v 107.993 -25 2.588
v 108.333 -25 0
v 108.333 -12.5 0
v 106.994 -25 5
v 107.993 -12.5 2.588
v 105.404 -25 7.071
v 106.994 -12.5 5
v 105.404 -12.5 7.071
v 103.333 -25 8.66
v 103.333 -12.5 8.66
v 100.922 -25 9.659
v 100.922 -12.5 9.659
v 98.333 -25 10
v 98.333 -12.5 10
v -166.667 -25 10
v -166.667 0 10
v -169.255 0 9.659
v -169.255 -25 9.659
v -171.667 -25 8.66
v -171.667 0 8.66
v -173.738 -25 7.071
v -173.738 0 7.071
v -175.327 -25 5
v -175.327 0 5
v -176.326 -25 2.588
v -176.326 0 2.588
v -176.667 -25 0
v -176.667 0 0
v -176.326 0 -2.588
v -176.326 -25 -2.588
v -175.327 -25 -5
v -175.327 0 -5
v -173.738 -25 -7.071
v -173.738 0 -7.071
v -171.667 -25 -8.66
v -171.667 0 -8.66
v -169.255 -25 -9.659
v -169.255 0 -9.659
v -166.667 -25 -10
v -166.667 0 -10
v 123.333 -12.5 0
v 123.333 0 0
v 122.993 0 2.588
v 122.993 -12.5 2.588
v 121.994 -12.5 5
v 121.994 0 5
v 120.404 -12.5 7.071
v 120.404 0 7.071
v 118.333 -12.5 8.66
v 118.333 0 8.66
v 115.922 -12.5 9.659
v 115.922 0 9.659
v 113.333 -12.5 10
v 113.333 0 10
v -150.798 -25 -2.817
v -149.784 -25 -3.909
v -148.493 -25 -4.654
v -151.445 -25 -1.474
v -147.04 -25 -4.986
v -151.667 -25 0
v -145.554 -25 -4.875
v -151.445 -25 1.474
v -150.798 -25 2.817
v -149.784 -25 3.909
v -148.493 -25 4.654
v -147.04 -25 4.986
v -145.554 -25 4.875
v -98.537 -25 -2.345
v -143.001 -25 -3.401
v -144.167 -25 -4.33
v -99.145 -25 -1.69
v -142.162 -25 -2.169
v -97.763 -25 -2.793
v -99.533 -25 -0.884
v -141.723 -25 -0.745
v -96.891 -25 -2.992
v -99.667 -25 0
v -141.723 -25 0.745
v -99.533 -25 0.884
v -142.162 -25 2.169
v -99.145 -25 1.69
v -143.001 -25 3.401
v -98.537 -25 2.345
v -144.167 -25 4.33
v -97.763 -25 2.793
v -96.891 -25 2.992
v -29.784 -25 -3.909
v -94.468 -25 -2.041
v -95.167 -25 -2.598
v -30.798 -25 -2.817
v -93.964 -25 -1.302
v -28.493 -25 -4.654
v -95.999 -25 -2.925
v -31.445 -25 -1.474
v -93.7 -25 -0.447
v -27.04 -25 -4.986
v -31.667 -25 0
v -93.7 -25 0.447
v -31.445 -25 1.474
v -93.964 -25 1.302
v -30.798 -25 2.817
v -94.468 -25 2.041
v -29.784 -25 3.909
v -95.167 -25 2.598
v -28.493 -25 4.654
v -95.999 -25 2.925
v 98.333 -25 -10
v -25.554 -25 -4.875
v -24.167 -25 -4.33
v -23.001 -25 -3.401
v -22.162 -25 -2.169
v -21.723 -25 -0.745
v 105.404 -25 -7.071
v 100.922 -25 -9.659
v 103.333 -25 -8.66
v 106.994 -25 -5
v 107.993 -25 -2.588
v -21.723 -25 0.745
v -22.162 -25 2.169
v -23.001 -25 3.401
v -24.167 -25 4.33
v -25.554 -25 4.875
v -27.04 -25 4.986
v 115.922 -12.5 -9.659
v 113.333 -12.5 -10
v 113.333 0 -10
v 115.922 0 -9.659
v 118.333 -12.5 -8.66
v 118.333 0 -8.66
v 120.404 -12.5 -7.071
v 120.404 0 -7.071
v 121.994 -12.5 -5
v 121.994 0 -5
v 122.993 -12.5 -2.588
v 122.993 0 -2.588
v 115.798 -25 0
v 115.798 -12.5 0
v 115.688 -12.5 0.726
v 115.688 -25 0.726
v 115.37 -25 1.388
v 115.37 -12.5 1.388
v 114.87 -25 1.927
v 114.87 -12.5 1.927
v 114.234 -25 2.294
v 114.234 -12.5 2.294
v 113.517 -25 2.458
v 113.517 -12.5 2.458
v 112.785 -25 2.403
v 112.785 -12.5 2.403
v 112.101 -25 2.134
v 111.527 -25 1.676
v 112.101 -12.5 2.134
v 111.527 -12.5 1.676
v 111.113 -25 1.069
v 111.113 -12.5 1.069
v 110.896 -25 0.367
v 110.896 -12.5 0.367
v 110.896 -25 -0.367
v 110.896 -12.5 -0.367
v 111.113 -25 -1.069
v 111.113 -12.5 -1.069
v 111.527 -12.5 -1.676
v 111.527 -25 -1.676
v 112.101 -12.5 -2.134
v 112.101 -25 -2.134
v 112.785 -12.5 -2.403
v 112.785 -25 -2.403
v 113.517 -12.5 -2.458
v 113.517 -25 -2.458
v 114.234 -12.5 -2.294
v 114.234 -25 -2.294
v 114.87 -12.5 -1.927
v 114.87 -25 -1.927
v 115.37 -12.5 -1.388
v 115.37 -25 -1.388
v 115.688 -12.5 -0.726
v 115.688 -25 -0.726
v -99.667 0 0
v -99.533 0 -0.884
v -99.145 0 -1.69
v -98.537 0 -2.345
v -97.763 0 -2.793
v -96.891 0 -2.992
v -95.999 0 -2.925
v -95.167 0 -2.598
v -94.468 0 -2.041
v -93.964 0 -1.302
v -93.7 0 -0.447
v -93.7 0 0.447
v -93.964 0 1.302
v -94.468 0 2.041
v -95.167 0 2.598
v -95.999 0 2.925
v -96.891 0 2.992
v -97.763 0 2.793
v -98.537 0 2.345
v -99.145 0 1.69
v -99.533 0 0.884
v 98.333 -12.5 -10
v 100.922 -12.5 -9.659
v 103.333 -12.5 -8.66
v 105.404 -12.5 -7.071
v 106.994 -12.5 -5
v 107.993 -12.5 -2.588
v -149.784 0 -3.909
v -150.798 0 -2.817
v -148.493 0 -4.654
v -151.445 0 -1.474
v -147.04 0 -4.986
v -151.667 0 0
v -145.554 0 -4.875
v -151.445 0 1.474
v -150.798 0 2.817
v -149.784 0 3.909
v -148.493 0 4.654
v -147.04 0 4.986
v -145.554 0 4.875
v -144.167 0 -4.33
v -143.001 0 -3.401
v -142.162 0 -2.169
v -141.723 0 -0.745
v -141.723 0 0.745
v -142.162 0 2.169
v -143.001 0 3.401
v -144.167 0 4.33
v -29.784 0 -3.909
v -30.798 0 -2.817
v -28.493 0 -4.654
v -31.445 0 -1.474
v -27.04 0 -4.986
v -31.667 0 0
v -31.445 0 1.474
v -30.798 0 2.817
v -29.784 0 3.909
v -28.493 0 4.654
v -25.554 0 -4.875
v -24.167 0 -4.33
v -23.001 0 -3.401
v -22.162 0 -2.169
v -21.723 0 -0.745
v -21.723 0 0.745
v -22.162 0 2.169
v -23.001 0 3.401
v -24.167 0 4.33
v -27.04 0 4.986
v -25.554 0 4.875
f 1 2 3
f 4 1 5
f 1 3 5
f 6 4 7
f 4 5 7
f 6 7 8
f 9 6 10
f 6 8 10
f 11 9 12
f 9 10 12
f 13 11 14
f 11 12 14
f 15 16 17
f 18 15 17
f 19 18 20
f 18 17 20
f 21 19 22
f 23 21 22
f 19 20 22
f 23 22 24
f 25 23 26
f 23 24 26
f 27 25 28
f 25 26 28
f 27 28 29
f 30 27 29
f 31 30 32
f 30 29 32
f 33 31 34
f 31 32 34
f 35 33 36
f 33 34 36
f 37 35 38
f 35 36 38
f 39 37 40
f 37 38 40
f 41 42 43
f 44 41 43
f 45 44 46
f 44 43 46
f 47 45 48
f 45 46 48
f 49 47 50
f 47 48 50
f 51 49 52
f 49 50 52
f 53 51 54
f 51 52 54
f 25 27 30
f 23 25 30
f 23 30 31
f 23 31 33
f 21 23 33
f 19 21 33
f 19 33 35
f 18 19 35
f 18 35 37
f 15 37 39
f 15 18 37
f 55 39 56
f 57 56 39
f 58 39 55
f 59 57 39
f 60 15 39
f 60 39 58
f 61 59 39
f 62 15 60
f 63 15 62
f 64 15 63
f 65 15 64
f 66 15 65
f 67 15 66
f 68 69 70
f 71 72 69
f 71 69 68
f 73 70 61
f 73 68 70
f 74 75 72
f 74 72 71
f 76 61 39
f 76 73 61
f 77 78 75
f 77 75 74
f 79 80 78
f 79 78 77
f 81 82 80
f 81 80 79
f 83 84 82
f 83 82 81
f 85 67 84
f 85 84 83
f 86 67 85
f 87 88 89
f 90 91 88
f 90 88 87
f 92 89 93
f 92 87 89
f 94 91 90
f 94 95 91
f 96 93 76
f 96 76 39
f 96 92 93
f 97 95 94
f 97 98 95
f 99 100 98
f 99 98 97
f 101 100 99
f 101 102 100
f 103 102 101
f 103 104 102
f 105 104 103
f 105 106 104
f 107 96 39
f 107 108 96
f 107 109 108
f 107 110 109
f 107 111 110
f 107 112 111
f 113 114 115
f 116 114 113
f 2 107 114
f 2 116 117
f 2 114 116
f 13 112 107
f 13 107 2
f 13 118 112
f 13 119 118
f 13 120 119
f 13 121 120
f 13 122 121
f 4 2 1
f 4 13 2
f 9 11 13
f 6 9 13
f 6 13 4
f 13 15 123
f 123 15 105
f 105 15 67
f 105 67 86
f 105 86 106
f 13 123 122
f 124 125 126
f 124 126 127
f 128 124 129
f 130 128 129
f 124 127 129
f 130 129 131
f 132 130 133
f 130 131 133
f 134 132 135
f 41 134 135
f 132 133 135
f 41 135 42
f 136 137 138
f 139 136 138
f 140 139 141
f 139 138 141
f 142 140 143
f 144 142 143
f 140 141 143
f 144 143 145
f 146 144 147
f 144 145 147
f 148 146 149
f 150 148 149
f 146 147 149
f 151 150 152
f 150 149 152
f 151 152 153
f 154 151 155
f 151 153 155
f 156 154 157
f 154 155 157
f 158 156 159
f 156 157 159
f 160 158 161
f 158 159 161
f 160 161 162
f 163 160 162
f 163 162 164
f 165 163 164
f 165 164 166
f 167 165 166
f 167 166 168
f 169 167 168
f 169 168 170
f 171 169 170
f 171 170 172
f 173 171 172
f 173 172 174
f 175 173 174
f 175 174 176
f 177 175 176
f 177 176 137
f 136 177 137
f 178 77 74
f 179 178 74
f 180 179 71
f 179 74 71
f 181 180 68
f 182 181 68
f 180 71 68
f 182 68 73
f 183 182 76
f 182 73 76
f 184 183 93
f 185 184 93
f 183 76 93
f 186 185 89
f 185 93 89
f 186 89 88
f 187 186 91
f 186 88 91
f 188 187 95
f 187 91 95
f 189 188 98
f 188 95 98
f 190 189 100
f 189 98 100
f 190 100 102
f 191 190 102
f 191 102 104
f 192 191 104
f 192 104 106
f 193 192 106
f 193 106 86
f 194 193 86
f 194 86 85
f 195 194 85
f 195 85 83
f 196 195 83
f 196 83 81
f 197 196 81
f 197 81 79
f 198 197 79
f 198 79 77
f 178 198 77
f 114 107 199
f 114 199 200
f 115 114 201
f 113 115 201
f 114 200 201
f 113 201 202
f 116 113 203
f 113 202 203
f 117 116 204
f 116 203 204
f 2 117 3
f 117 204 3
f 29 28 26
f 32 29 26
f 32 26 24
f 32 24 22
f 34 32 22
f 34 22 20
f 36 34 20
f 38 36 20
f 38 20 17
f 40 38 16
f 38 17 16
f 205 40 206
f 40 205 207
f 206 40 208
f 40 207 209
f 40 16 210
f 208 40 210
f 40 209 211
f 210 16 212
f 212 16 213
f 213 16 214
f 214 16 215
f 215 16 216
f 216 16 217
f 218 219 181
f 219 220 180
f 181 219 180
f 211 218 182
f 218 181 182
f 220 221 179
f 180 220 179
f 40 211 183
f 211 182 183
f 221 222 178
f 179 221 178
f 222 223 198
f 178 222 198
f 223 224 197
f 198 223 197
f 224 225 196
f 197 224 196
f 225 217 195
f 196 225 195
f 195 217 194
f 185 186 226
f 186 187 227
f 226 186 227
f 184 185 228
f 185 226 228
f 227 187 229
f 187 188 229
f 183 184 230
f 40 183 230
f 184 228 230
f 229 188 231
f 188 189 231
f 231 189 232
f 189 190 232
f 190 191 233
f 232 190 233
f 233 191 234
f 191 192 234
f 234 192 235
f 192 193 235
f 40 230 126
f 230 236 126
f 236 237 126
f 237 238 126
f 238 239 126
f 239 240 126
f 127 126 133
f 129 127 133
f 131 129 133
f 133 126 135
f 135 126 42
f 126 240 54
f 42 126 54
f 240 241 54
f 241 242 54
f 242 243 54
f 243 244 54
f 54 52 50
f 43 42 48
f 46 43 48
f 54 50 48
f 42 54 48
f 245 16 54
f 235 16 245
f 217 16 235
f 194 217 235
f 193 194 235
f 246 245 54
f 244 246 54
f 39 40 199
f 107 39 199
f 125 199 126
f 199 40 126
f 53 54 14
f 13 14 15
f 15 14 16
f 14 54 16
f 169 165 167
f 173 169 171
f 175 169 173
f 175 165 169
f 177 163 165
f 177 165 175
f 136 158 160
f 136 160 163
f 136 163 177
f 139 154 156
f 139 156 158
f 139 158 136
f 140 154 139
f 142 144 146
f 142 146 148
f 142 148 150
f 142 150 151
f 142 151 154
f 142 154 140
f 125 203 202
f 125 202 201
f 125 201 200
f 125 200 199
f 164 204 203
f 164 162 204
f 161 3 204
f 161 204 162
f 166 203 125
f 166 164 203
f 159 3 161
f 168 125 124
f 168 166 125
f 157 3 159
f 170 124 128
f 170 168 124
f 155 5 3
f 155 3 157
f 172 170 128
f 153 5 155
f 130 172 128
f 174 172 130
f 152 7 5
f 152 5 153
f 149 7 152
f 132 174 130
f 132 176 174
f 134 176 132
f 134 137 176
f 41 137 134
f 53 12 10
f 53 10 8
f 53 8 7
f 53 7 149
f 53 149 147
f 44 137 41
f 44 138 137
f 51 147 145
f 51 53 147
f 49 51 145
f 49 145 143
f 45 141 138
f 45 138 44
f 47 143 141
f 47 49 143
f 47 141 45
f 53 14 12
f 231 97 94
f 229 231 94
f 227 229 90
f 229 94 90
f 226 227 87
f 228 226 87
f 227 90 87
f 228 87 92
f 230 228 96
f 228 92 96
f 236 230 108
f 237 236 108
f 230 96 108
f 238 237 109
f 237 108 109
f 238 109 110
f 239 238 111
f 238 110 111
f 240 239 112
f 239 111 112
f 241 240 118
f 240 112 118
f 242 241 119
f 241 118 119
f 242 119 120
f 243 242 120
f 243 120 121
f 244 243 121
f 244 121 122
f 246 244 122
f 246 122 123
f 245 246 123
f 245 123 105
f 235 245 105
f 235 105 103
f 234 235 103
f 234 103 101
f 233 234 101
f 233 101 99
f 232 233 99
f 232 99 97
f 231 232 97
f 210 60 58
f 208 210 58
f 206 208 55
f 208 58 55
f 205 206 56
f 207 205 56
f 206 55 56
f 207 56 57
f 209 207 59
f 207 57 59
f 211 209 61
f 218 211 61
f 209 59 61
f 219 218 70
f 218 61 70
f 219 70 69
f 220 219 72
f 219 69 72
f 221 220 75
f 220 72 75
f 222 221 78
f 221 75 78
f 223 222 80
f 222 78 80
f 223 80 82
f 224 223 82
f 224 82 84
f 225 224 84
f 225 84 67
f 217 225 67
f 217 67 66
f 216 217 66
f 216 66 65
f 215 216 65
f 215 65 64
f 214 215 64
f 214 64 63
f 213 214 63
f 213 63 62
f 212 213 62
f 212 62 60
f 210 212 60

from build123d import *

# Parameters (mm, degrees)
F0_W     = 50
F0_H     = 10
F0_W_2   = 70
F1_DEPTH = 25
F0_R     = 2.4644634523
F2_DEPTH = 12.5
F3_D     = 10
F4_D     = 10
F5_D     = 6


with BuildPart() as f1:
    # F0 (on Front) → F1 (new body)
    with BuildSketch(Plane.XZ):
        with BuildLine():
            Line((98.3333257594, 10), (-26.6666742406, 10))
            Line((-26.6666742406, 10), (-26.6666742406, 0))
            Line((-26.6666742406, 0), (-26.6666742406, -10))
            Line((-26.6666742406, -10), (98.3333257594, -10))
            ThreePointArc((98.3333257594, -10), (105.4043935713, -7.0710678119), (108.3333257594, 0))
            ThreePointArc((108.3333257594, 0), (105.4043935713, 7.0710678119), (98.3333257594, 10))
        make_face()
        with BuildLine():
            Line((-146.6666742406, 10), (-166.6666742406, 10))
            ThreePointArc((-166.6666742406, 10), (-173.7377420524, 7.0710678119), (-176.6666742406, 0))
            Line((-176.6666742406, 0), (-146.6666742406, 0))
            Line((-146.6666742406, 0), (-146.6666742406, 10))
        make_face()
        with BuildLine():
            Line((-146.6666742406, 0), (-176.6666742406, 0))
            ThreePointArc((-176.6666742406, 0), (-173.7377420524, -7.0710678119), (-166.6666742406, -10))
            Line((-166.6666742406, -10), (-146.6666742406, -10))
            Line((-146.6666742406, -10), (-146.6666742406, 0))
        make_face()
        with Locations((-121.6666742406, -5)):
            Rectangle(F0_W, F0_H)
        with Locations((-61.6666742406, -5)):
            Rectangle(F0_W_2, F0_H)
        with Locations((-121.6666742406, 5)):
            Rectangle(F0_W, F0_H)
        with Locations((-61.6666742406, 5)):
            Rectangle(F0_W_2, F0_H)
    extrude(amount=F1_DEPTH)



with BuildPart() as f1b:
    # F0 (on Front) → F1, piece 2 (new body)
    with BuildSketch(Plane.XZ):
        with Locations((113.3333257594, 0)):
            Circle(F0_R)
    extrude(amount=F1_DEPTH)


with BuildPart() as f1_1:
    add(f1.part)

    add(f1b.part)  # F2 merges F1b
    # F0 (on Front) → F2 (join)
    with BuildSketch(Plane.XZ):
        with BuildLine():
            Line((113.3333257594, 10), (98.3333257594, 10))
            ThreePointArc((98.3333257594, 10), (105.4043935713, 7.0710678119), (108.3333257594, 0))
            ThreePointArc((108.3333257594, 0), (105.4043935713, -7.0710678119), (98.3333257594, -10))
            Line((98.3333257594, -10), (113.3333257594, -10))
            ThreePointArc((113.3333257594, -10), (120.4043935713, -7.0710678119), (123.3333257594, 0))
            ThreePointArc((123.3333257594, 0), (120.4043935713, 7.0710678119), (113.3333257594, 10))
        make_face()
        with Locations((113.3333257594, 0)):
            Circle(F0_R, mode=Mode.SUBTRACT)
    extrude(amount=F2_DEPTH)

    # F3 (through all)
    with Locations(Plane(origin=(0, 0, 0), x_dir=(1, 0, 0), z_dir=(0, 1, 0))):
        with Locations((-146.6666742406, 0)):
            Hole(F3_D / 2)

    # F4 (through all)
    with Locations(Plane(origin=(0, 0, 0), x_dir=(1, 0, 0), z_dir=(0, 1, 0))):
        with Locations((-26.6666742406, 0)):
            Hole(F4_D / 2)

    # F5 (through all)
    with Locations(Plane(origin=(0, 0, 0), x_dir=(1, 0, 0), z_dir=(0, 1, 0))):
        with Locations((-96.6666742406, 0)):
            Hole(F5_D / 2)


solid = f1_1.part
